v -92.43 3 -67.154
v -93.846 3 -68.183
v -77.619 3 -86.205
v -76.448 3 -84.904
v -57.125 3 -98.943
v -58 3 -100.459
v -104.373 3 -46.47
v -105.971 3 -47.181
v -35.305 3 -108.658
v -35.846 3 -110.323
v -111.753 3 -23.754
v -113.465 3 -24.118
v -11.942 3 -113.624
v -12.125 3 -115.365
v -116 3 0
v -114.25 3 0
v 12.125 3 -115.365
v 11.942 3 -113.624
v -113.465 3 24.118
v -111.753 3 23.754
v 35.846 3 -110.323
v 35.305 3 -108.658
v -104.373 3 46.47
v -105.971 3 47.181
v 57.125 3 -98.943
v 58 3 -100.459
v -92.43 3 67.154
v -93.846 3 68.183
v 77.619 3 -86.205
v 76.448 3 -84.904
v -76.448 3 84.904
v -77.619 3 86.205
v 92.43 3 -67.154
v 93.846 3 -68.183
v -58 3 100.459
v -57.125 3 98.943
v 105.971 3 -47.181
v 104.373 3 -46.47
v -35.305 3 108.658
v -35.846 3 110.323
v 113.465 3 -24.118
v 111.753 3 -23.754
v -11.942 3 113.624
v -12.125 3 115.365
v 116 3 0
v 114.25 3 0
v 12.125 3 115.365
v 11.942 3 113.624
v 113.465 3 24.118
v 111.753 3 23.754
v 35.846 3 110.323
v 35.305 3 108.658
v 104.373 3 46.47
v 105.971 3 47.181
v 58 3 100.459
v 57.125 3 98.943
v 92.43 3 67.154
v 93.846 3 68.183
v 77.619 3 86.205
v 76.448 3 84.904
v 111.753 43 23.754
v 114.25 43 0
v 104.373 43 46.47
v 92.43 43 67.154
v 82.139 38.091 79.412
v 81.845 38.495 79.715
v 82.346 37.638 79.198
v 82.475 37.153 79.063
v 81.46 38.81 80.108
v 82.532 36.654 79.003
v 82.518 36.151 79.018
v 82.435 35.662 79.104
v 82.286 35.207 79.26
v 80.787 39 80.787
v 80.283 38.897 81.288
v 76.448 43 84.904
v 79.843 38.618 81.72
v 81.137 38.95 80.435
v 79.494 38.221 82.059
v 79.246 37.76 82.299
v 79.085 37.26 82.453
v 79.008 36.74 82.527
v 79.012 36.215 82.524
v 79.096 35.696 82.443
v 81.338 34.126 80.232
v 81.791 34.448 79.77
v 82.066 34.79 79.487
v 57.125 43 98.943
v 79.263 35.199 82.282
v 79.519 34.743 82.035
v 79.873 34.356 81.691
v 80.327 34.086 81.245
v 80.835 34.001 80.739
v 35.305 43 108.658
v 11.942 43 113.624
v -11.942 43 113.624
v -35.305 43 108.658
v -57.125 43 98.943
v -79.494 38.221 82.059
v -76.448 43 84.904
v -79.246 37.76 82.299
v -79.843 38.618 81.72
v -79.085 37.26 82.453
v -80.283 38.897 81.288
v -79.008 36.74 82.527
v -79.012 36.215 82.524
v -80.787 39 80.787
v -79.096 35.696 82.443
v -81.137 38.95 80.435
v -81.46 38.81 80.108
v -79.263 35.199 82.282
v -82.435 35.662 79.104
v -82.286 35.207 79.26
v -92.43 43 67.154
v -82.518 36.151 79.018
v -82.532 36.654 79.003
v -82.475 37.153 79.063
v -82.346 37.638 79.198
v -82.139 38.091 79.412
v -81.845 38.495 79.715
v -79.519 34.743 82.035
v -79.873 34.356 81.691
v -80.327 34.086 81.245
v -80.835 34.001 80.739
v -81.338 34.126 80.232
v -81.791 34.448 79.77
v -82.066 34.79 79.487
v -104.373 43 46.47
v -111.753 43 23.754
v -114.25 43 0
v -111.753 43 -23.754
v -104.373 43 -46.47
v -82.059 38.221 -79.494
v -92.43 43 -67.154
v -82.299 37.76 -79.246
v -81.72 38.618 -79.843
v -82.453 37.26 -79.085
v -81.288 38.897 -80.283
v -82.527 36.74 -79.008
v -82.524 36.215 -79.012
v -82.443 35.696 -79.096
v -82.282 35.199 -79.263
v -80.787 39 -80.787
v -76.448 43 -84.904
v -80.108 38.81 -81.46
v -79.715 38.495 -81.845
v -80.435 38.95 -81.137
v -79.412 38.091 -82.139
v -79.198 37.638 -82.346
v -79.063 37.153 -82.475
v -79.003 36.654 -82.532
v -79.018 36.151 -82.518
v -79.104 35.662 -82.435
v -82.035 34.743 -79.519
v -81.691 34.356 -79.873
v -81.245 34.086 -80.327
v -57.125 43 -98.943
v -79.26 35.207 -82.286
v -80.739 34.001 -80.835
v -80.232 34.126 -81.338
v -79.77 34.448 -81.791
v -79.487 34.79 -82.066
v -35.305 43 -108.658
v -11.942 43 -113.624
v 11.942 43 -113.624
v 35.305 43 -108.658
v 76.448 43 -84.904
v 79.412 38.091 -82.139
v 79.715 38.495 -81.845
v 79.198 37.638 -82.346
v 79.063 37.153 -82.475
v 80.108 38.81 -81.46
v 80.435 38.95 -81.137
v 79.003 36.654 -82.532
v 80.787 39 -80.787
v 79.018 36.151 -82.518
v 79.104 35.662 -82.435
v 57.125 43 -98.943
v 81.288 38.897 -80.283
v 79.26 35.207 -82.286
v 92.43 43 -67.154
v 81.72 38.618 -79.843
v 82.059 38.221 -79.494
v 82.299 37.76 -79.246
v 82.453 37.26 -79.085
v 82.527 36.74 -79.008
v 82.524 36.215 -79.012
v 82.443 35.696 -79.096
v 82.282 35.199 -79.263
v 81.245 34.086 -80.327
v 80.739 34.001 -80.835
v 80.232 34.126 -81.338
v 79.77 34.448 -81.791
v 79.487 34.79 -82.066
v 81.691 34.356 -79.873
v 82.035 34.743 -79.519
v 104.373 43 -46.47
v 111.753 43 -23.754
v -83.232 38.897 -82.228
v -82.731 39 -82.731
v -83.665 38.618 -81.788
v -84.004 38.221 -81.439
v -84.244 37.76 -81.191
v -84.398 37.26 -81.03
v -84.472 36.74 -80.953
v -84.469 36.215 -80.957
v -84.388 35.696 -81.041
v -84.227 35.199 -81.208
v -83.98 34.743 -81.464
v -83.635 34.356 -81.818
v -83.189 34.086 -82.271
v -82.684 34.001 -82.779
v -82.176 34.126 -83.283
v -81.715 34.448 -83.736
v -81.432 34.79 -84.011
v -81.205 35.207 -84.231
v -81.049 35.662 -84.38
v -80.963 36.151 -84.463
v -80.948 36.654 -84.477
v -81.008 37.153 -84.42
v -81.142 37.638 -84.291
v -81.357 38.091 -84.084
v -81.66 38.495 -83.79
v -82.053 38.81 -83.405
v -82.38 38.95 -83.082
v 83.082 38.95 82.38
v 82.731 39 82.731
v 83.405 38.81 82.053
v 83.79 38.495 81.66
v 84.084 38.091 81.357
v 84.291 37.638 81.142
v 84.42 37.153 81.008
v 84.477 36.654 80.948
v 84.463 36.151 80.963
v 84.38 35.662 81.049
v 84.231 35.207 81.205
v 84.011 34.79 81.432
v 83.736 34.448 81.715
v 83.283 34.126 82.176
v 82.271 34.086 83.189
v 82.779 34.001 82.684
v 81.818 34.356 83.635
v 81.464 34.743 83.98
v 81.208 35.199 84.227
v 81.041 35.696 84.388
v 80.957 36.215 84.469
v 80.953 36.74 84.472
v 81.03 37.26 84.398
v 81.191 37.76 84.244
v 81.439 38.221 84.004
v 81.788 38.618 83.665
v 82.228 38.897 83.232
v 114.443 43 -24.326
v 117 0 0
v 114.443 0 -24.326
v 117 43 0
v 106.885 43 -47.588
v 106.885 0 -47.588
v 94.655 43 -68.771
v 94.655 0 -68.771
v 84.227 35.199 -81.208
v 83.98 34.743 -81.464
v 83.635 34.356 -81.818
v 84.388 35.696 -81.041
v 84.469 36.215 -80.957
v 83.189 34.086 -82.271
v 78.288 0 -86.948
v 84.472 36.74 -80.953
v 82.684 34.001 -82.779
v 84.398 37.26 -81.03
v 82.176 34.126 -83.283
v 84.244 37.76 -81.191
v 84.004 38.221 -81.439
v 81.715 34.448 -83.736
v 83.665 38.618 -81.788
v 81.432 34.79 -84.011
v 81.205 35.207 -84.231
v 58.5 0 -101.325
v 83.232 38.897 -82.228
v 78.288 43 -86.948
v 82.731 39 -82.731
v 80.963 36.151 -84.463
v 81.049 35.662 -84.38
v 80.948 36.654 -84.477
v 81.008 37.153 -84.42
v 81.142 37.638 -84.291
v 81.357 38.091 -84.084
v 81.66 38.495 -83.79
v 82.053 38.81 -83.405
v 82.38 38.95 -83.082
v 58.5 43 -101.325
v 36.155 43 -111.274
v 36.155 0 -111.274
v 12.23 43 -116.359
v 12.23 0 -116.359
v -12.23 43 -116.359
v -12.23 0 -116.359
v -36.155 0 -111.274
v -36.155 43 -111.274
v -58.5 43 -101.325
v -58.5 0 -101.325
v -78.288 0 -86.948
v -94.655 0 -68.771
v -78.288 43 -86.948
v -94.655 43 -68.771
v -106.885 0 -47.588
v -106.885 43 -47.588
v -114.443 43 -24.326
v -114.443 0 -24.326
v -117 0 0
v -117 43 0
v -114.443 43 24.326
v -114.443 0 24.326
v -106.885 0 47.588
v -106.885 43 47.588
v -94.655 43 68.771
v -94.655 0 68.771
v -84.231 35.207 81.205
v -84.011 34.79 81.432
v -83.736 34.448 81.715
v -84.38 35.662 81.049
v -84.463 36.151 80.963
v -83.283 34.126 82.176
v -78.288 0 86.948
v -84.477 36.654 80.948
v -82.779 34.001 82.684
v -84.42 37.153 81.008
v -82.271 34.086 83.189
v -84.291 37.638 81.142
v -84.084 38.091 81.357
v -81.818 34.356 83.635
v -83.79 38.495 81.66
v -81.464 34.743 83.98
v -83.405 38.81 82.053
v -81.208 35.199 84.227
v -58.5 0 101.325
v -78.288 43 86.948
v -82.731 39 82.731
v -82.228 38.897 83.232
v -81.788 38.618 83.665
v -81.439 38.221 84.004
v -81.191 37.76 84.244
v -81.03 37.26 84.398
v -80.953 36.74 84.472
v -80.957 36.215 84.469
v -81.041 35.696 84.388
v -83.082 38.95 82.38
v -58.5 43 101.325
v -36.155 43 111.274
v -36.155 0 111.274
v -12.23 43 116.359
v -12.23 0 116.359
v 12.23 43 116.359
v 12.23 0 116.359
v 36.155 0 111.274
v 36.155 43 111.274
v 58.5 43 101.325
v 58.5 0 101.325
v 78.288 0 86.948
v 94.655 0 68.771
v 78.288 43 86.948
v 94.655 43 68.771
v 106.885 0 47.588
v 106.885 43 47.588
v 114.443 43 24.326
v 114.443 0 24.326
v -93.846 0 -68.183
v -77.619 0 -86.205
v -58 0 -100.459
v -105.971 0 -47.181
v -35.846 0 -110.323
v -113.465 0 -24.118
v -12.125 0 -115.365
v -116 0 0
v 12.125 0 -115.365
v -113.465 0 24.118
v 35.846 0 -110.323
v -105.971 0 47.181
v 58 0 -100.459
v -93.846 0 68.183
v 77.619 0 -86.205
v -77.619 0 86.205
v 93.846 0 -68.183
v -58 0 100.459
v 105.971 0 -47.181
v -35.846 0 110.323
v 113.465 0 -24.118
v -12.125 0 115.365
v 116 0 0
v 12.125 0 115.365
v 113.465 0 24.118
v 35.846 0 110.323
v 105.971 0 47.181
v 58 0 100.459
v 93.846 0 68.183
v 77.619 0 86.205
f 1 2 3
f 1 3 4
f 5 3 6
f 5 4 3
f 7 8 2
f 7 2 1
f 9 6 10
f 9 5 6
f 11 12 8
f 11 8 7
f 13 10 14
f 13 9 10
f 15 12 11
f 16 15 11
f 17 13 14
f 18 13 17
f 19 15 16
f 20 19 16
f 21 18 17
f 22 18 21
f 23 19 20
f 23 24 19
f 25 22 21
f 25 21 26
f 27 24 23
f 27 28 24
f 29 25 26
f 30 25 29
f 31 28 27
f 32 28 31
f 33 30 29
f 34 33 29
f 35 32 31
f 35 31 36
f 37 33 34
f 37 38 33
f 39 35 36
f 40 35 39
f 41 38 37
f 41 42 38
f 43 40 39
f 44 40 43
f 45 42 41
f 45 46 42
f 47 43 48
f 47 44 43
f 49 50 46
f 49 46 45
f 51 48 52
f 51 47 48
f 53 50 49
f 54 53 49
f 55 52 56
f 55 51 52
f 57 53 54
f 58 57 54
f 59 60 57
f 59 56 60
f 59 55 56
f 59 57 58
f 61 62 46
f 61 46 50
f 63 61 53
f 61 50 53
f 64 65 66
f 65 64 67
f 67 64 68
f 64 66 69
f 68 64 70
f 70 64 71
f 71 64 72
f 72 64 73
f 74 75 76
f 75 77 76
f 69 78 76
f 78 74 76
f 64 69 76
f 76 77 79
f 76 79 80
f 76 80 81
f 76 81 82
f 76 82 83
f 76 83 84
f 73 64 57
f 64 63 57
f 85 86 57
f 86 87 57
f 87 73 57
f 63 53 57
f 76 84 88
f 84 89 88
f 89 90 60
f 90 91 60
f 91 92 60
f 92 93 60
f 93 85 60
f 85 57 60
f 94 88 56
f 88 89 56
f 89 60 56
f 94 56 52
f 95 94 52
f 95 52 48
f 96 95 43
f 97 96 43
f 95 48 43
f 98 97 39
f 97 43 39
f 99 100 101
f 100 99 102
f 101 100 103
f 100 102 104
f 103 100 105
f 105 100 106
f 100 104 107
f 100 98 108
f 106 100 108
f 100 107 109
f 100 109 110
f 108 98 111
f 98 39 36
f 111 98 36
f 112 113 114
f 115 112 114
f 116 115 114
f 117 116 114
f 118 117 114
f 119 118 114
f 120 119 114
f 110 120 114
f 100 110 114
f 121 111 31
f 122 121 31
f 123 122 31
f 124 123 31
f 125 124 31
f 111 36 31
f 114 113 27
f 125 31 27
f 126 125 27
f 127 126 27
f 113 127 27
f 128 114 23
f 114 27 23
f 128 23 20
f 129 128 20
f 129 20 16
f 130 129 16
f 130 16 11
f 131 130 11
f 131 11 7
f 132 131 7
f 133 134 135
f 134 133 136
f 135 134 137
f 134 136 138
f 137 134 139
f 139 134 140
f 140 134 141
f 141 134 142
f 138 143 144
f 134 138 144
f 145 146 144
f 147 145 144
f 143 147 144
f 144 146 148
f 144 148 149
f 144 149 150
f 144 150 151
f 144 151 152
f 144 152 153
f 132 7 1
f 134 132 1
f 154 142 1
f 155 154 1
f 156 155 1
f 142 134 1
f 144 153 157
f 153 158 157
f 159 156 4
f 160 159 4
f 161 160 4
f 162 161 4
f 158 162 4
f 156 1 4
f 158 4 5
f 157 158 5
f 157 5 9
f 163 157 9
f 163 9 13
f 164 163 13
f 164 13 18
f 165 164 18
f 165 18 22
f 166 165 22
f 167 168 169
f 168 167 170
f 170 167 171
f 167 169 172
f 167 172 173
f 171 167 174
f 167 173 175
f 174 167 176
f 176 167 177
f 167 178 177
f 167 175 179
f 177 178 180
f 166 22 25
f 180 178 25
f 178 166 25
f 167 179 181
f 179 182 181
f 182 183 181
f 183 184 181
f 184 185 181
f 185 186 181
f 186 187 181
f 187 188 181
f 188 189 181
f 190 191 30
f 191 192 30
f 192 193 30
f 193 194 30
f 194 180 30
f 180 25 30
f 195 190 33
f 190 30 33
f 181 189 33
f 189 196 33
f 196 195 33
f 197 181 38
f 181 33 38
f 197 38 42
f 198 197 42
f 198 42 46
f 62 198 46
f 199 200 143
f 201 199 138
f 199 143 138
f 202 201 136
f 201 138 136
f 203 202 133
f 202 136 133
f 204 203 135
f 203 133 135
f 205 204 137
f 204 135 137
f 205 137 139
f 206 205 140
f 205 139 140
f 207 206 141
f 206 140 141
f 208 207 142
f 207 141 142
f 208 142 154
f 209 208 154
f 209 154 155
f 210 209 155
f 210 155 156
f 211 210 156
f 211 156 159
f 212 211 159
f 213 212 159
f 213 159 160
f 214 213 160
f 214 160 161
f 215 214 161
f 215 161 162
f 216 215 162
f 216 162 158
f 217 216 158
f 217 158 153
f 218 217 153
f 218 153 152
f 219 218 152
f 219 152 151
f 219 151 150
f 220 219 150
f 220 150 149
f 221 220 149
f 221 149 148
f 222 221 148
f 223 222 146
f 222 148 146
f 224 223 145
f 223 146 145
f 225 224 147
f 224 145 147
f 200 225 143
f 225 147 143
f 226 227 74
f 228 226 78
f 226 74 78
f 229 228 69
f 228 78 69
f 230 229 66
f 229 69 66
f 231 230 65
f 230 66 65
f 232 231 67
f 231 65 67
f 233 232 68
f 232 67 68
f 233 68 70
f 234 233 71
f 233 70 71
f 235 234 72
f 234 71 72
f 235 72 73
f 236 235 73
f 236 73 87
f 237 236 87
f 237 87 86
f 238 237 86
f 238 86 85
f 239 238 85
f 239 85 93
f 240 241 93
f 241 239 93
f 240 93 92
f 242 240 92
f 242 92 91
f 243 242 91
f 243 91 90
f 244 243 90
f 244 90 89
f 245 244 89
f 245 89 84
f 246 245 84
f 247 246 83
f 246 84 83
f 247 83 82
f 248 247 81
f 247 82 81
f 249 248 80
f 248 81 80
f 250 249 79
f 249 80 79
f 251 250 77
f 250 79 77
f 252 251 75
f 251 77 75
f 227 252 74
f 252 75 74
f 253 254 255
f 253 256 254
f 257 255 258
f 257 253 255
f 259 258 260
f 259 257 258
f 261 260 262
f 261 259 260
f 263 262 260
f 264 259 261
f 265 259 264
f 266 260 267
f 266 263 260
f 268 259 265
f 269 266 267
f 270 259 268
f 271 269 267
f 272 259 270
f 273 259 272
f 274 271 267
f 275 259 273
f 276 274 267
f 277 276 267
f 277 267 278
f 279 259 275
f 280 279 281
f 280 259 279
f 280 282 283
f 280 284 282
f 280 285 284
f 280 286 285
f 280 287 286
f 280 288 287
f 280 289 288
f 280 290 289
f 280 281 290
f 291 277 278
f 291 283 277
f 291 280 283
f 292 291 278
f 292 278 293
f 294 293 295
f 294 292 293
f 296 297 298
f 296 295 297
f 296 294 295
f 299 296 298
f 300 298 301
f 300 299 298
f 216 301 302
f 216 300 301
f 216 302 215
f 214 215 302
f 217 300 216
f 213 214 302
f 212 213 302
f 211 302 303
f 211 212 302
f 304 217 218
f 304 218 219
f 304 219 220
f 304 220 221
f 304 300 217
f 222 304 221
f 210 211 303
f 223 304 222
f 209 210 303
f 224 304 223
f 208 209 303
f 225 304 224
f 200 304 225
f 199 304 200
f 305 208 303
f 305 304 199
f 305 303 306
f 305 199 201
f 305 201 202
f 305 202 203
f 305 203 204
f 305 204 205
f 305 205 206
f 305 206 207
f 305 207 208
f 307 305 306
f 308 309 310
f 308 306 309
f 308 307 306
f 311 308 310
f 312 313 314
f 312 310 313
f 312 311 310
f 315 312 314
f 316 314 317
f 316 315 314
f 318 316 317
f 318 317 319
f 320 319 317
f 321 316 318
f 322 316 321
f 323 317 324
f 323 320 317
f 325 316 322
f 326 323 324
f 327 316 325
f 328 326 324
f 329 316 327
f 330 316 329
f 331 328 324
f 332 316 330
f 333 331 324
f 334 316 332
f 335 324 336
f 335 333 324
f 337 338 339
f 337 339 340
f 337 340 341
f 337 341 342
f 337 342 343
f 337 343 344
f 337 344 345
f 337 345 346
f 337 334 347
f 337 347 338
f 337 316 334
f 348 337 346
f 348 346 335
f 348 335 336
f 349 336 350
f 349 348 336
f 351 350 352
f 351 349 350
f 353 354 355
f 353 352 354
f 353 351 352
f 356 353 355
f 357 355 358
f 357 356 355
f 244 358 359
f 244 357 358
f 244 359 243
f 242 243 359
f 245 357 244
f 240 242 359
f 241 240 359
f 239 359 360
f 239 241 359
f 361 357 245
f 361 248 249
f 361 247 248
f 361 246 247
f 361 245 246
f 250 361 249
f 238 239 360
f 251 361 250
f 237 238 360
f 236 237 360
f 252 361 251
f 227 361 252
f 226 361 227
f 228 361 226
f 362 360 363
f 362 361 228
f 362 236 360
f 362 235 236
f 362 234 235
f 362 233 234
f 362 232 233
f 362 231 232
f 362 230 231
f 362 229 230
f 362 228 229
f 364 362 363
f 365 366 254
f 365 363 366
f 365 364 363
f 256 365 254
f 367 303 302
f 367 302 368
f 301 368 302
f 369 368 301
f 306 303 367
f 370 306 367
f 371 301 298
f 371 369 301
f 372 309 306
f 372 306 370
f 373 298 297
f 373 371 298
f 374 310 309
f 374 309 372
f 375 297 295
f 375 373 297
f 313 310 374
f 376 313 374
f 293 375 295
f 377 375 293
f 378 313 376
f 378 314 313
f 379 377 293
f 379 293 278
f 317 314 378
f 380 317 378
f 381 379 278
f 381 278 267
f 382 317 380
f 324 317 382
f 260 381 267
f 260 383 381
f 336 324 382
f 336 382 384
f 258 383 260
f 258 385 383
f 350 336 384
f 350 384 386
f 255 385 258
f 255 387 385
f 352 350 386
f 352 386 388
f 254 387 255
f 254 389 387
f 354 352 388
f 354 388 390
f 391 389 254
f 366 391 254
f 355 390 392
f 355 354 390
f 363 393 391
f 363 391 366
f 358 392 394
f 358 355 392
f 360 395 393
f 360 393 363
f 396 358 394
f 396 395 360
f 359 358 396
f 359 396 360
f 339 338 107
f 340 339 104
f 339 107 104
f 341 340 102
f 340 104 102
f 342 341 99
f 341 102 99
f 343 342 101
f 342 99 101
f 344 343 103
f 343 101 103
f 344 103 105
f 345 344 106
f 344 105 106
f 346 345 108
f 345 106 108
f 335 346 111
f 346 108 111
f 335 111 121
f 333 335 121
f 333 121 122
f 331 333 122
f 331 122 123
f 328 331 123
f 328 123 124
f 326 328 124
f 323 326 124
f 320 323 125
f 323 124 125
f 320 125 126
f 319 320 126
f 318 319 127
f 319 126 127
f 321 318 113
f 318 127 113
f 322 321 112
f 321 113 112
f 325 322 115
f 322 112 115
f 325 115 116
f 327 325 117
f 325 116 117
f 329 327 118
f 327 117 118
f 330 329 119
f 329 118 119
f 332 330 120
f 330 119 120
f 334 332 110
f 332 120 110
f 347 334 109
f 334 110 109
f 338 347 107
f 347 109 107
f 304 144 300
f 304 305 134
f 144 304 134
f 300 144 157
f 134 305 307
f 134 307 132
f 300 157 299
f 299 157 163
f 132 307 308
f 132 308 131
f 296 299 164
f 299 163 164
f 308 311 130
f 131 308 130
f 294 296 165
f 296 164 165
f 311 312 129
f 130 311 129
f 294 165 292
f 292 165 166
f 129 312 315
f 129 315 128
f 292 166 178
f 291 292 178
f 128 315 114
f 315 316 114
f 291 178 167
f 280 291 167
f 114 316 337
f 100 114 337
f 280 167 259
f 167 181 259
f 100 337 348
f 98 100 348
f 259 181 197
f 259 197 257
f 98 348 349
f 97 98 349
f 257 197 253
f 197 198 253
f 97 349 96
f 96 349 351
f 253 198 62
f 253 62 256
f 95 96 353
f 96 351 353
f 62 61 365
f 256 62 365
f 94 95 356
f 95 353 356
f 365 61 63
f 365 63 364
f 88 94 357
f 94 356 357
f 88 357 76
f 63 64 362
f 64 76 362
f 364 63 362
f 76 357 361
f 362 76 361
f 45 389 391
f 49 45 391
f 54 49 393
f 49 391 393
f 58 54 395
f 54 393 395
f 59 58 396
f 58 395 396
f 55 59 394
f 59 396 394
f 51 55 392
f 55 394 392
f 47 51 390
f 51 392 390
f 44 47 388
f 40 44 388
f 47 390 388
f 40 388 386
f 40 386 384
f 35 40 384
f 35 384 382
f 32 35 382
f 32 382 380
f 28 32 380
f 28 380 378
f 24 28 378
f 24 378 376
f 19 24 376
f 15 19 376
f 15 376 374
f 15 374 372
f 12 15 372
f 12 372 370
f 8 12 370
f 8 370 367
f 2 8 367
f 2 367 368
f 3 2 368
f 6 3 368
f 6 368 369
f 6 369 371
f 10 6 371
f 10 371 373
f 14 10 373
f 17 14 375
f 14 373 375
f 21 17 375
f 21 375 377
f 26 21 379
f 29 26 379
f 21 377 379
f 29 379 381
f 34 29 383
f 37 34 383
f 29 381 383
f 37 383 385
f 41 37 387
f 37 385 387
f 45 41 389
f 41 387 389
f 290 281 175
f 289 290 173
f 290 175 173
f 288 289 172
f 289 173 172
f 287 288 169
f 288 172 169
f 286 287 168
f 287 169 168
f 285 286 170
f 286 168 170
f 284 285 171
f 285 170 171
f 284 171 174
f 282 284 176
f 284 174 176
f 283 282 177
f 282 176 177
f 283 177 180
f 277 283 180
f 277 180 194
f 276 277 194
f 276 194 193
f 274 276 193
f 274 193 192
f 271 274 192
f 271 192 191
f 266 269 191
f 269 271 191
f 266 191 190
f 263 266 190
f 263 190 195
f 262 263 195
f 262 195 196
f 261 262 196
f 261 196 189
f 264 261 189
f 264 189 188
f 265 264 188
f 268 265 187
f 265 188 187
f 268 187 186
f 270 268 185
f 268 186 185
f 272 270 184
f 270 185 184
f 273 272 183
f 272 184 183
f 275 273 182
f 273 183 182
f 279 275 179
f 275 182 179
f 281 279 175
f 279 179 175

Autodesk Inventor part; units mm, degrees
ref_plane "XZ Plane" through (0, 0, 0) normal (0, 1, 0) x (-1, 0, 0)
ref_plane "XY Plane" through (0, 0, 0) normal (0, 0, 1) x (1, 0, 0)
sketch "Sketch1" plane through (0, 0, 0) normal (0, 0, 1) x (1, 0, 0)
  line L0 (0, 0) -> (0, -20.7931)
  line L1 (117, 0) -> (117, 43)
  line L2 (117, 43) -> (114.25, 43)
  line L3 (114.25, 43) -> (114.25, 3)
  line L4 (114.25, 3) -> (116, 3)
  line L5 (116, 3) -> (116, 0)
  line L6 (116, 0) -> (117, 0)
  dimension "d1" = 234
  dimension "d2" = 228.5
  dimension "d6" = 1
  dimension "d7" = 3
revolve "Revolution1" add sketch "Sketch1" angle 360 about axis through (0, 0, 0) along (0, -1, 0)
ref_plane "Work Plane1" through (0, 0, 0) normal (0.7071, 0, -0.7071) x (0, 1, 0)
sketch "Sketch2" plane through (0, 0, 0) normal (0.7071, 0, -0.7071) x (0, 1, 0)
  circle A0 centre (36.5, 0) radius 2.5
  line L0 (43, 117) -> (43, -117) construction
  point P0 (0, 0)
  point P1 (43, 0)
  dimension "d9" = 5
  dimension "d10" = 6.5
extrude "Extrusion1" cut sketch "Sketch2" along normal through all both and the other way through all
pattern_circular "Circular Pattern1" count 4 over 360 about axis through (0, 21.5, 0) along (0, -1, 0) of "Extrusion1"
properties part number "bucket" material "ABS Plastic"
